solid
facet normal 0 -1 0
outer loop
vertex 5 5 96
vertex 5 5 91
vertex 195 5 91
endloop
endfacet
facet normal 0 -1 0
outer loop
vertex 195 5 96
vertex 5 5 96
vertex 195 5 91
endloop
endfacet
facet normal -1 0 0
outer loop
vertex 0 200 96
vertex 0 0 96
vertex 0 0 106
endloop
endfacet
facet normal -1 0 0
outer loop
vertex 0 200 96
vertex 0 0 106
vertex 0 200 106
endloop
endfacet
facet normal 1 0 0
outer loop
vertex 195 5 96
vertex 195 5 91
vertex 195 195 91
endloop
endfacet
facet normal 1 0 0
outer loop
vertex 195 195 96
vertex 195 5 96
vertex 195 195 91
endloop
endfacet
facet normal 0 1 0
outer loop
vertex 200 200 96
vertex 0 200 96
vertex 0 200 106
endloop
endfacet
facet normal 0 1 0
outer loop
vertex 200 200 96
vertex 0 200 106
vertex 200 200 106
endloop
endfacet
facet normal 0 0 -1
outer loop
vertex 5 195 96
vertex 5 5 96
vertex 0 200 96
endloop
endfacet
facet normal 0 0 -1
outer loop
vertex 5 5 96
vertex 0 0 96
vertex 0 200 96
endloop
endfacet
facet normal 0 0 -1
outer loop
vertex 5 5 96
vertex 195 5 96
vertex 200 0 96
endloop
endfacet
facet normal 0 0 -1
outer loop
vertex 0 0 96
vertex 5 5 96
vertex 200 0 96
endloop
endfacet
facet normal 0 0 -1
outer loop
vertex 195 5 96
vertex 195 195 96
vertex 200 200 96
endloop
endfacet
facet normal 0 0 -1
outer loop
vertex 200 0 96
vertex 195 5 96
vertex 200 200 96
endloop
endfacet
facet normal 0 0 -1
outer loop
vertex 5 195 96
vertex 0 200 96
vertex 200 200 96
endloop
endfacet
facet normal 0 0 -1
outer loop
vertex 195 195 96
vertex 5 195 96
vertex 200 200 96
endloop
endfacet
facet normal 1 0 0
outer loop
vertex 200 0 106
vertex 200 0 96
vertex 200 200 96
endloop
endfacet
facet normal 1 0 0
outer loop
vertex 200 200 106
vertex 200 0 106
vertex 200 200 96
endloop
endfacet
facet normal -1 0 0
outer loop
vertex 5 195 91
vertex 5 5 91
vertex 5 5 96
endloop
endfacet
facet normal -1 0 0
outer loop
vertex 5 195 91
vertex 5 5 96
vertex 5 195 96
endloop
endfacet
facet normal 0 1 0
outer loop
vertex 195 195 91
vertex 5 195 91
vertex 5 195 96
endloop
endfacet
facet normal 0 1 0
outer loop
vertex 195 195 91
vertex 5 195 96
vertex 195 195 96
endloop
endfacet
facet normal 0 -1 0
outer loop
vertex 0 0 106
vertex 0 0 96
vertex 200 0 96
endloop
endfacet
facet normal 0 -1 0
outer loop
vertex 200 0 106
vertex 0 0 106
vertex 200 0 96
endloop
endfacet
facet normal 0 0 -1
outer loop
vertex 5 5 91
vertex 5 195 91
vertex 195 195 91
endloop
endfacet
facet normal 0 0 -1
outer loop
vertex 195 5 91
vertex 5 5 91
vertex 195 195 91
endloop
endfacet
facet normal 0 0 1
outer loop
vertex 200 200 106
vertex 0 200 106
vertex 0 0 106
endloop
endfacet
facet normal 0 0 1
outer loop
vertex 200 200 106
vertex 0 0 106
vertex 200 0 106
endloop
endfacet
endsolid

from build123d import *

# Parameters (mm, degrees)
BOX006_W     = 190
BOX006_H     = 190
BOX006_DEPTH = 15
BOX005_W     = 200
BOX005_H     = 200
BOX005_DEPTH = 10


with BuildPart() as cube006:
    # Box006 → Box006 (new body)
    with BuildSketch(Plane(origin=(5, 5, 91), x_dir=(1, 0, 0), z_dir=(0, 0, 1))):
        with Locations((95, 95)):
            Rectangle(BOX006_W, BOX006_H)
    extrude(amount=BOX006_DEPTH)


with BuildPart() as lid:
    # Box005 → Box005 (new body)
    with BuildSketch(Plane.XY.offset(96)):
        with Locations((100, 100)):
            Rectangle(BOX005_W, BOX005_H)
    extrude(amount=BOX005_DEPTH)

    # Fusion002: union Cube006
    add(cube006.part)


solid = lid.part
